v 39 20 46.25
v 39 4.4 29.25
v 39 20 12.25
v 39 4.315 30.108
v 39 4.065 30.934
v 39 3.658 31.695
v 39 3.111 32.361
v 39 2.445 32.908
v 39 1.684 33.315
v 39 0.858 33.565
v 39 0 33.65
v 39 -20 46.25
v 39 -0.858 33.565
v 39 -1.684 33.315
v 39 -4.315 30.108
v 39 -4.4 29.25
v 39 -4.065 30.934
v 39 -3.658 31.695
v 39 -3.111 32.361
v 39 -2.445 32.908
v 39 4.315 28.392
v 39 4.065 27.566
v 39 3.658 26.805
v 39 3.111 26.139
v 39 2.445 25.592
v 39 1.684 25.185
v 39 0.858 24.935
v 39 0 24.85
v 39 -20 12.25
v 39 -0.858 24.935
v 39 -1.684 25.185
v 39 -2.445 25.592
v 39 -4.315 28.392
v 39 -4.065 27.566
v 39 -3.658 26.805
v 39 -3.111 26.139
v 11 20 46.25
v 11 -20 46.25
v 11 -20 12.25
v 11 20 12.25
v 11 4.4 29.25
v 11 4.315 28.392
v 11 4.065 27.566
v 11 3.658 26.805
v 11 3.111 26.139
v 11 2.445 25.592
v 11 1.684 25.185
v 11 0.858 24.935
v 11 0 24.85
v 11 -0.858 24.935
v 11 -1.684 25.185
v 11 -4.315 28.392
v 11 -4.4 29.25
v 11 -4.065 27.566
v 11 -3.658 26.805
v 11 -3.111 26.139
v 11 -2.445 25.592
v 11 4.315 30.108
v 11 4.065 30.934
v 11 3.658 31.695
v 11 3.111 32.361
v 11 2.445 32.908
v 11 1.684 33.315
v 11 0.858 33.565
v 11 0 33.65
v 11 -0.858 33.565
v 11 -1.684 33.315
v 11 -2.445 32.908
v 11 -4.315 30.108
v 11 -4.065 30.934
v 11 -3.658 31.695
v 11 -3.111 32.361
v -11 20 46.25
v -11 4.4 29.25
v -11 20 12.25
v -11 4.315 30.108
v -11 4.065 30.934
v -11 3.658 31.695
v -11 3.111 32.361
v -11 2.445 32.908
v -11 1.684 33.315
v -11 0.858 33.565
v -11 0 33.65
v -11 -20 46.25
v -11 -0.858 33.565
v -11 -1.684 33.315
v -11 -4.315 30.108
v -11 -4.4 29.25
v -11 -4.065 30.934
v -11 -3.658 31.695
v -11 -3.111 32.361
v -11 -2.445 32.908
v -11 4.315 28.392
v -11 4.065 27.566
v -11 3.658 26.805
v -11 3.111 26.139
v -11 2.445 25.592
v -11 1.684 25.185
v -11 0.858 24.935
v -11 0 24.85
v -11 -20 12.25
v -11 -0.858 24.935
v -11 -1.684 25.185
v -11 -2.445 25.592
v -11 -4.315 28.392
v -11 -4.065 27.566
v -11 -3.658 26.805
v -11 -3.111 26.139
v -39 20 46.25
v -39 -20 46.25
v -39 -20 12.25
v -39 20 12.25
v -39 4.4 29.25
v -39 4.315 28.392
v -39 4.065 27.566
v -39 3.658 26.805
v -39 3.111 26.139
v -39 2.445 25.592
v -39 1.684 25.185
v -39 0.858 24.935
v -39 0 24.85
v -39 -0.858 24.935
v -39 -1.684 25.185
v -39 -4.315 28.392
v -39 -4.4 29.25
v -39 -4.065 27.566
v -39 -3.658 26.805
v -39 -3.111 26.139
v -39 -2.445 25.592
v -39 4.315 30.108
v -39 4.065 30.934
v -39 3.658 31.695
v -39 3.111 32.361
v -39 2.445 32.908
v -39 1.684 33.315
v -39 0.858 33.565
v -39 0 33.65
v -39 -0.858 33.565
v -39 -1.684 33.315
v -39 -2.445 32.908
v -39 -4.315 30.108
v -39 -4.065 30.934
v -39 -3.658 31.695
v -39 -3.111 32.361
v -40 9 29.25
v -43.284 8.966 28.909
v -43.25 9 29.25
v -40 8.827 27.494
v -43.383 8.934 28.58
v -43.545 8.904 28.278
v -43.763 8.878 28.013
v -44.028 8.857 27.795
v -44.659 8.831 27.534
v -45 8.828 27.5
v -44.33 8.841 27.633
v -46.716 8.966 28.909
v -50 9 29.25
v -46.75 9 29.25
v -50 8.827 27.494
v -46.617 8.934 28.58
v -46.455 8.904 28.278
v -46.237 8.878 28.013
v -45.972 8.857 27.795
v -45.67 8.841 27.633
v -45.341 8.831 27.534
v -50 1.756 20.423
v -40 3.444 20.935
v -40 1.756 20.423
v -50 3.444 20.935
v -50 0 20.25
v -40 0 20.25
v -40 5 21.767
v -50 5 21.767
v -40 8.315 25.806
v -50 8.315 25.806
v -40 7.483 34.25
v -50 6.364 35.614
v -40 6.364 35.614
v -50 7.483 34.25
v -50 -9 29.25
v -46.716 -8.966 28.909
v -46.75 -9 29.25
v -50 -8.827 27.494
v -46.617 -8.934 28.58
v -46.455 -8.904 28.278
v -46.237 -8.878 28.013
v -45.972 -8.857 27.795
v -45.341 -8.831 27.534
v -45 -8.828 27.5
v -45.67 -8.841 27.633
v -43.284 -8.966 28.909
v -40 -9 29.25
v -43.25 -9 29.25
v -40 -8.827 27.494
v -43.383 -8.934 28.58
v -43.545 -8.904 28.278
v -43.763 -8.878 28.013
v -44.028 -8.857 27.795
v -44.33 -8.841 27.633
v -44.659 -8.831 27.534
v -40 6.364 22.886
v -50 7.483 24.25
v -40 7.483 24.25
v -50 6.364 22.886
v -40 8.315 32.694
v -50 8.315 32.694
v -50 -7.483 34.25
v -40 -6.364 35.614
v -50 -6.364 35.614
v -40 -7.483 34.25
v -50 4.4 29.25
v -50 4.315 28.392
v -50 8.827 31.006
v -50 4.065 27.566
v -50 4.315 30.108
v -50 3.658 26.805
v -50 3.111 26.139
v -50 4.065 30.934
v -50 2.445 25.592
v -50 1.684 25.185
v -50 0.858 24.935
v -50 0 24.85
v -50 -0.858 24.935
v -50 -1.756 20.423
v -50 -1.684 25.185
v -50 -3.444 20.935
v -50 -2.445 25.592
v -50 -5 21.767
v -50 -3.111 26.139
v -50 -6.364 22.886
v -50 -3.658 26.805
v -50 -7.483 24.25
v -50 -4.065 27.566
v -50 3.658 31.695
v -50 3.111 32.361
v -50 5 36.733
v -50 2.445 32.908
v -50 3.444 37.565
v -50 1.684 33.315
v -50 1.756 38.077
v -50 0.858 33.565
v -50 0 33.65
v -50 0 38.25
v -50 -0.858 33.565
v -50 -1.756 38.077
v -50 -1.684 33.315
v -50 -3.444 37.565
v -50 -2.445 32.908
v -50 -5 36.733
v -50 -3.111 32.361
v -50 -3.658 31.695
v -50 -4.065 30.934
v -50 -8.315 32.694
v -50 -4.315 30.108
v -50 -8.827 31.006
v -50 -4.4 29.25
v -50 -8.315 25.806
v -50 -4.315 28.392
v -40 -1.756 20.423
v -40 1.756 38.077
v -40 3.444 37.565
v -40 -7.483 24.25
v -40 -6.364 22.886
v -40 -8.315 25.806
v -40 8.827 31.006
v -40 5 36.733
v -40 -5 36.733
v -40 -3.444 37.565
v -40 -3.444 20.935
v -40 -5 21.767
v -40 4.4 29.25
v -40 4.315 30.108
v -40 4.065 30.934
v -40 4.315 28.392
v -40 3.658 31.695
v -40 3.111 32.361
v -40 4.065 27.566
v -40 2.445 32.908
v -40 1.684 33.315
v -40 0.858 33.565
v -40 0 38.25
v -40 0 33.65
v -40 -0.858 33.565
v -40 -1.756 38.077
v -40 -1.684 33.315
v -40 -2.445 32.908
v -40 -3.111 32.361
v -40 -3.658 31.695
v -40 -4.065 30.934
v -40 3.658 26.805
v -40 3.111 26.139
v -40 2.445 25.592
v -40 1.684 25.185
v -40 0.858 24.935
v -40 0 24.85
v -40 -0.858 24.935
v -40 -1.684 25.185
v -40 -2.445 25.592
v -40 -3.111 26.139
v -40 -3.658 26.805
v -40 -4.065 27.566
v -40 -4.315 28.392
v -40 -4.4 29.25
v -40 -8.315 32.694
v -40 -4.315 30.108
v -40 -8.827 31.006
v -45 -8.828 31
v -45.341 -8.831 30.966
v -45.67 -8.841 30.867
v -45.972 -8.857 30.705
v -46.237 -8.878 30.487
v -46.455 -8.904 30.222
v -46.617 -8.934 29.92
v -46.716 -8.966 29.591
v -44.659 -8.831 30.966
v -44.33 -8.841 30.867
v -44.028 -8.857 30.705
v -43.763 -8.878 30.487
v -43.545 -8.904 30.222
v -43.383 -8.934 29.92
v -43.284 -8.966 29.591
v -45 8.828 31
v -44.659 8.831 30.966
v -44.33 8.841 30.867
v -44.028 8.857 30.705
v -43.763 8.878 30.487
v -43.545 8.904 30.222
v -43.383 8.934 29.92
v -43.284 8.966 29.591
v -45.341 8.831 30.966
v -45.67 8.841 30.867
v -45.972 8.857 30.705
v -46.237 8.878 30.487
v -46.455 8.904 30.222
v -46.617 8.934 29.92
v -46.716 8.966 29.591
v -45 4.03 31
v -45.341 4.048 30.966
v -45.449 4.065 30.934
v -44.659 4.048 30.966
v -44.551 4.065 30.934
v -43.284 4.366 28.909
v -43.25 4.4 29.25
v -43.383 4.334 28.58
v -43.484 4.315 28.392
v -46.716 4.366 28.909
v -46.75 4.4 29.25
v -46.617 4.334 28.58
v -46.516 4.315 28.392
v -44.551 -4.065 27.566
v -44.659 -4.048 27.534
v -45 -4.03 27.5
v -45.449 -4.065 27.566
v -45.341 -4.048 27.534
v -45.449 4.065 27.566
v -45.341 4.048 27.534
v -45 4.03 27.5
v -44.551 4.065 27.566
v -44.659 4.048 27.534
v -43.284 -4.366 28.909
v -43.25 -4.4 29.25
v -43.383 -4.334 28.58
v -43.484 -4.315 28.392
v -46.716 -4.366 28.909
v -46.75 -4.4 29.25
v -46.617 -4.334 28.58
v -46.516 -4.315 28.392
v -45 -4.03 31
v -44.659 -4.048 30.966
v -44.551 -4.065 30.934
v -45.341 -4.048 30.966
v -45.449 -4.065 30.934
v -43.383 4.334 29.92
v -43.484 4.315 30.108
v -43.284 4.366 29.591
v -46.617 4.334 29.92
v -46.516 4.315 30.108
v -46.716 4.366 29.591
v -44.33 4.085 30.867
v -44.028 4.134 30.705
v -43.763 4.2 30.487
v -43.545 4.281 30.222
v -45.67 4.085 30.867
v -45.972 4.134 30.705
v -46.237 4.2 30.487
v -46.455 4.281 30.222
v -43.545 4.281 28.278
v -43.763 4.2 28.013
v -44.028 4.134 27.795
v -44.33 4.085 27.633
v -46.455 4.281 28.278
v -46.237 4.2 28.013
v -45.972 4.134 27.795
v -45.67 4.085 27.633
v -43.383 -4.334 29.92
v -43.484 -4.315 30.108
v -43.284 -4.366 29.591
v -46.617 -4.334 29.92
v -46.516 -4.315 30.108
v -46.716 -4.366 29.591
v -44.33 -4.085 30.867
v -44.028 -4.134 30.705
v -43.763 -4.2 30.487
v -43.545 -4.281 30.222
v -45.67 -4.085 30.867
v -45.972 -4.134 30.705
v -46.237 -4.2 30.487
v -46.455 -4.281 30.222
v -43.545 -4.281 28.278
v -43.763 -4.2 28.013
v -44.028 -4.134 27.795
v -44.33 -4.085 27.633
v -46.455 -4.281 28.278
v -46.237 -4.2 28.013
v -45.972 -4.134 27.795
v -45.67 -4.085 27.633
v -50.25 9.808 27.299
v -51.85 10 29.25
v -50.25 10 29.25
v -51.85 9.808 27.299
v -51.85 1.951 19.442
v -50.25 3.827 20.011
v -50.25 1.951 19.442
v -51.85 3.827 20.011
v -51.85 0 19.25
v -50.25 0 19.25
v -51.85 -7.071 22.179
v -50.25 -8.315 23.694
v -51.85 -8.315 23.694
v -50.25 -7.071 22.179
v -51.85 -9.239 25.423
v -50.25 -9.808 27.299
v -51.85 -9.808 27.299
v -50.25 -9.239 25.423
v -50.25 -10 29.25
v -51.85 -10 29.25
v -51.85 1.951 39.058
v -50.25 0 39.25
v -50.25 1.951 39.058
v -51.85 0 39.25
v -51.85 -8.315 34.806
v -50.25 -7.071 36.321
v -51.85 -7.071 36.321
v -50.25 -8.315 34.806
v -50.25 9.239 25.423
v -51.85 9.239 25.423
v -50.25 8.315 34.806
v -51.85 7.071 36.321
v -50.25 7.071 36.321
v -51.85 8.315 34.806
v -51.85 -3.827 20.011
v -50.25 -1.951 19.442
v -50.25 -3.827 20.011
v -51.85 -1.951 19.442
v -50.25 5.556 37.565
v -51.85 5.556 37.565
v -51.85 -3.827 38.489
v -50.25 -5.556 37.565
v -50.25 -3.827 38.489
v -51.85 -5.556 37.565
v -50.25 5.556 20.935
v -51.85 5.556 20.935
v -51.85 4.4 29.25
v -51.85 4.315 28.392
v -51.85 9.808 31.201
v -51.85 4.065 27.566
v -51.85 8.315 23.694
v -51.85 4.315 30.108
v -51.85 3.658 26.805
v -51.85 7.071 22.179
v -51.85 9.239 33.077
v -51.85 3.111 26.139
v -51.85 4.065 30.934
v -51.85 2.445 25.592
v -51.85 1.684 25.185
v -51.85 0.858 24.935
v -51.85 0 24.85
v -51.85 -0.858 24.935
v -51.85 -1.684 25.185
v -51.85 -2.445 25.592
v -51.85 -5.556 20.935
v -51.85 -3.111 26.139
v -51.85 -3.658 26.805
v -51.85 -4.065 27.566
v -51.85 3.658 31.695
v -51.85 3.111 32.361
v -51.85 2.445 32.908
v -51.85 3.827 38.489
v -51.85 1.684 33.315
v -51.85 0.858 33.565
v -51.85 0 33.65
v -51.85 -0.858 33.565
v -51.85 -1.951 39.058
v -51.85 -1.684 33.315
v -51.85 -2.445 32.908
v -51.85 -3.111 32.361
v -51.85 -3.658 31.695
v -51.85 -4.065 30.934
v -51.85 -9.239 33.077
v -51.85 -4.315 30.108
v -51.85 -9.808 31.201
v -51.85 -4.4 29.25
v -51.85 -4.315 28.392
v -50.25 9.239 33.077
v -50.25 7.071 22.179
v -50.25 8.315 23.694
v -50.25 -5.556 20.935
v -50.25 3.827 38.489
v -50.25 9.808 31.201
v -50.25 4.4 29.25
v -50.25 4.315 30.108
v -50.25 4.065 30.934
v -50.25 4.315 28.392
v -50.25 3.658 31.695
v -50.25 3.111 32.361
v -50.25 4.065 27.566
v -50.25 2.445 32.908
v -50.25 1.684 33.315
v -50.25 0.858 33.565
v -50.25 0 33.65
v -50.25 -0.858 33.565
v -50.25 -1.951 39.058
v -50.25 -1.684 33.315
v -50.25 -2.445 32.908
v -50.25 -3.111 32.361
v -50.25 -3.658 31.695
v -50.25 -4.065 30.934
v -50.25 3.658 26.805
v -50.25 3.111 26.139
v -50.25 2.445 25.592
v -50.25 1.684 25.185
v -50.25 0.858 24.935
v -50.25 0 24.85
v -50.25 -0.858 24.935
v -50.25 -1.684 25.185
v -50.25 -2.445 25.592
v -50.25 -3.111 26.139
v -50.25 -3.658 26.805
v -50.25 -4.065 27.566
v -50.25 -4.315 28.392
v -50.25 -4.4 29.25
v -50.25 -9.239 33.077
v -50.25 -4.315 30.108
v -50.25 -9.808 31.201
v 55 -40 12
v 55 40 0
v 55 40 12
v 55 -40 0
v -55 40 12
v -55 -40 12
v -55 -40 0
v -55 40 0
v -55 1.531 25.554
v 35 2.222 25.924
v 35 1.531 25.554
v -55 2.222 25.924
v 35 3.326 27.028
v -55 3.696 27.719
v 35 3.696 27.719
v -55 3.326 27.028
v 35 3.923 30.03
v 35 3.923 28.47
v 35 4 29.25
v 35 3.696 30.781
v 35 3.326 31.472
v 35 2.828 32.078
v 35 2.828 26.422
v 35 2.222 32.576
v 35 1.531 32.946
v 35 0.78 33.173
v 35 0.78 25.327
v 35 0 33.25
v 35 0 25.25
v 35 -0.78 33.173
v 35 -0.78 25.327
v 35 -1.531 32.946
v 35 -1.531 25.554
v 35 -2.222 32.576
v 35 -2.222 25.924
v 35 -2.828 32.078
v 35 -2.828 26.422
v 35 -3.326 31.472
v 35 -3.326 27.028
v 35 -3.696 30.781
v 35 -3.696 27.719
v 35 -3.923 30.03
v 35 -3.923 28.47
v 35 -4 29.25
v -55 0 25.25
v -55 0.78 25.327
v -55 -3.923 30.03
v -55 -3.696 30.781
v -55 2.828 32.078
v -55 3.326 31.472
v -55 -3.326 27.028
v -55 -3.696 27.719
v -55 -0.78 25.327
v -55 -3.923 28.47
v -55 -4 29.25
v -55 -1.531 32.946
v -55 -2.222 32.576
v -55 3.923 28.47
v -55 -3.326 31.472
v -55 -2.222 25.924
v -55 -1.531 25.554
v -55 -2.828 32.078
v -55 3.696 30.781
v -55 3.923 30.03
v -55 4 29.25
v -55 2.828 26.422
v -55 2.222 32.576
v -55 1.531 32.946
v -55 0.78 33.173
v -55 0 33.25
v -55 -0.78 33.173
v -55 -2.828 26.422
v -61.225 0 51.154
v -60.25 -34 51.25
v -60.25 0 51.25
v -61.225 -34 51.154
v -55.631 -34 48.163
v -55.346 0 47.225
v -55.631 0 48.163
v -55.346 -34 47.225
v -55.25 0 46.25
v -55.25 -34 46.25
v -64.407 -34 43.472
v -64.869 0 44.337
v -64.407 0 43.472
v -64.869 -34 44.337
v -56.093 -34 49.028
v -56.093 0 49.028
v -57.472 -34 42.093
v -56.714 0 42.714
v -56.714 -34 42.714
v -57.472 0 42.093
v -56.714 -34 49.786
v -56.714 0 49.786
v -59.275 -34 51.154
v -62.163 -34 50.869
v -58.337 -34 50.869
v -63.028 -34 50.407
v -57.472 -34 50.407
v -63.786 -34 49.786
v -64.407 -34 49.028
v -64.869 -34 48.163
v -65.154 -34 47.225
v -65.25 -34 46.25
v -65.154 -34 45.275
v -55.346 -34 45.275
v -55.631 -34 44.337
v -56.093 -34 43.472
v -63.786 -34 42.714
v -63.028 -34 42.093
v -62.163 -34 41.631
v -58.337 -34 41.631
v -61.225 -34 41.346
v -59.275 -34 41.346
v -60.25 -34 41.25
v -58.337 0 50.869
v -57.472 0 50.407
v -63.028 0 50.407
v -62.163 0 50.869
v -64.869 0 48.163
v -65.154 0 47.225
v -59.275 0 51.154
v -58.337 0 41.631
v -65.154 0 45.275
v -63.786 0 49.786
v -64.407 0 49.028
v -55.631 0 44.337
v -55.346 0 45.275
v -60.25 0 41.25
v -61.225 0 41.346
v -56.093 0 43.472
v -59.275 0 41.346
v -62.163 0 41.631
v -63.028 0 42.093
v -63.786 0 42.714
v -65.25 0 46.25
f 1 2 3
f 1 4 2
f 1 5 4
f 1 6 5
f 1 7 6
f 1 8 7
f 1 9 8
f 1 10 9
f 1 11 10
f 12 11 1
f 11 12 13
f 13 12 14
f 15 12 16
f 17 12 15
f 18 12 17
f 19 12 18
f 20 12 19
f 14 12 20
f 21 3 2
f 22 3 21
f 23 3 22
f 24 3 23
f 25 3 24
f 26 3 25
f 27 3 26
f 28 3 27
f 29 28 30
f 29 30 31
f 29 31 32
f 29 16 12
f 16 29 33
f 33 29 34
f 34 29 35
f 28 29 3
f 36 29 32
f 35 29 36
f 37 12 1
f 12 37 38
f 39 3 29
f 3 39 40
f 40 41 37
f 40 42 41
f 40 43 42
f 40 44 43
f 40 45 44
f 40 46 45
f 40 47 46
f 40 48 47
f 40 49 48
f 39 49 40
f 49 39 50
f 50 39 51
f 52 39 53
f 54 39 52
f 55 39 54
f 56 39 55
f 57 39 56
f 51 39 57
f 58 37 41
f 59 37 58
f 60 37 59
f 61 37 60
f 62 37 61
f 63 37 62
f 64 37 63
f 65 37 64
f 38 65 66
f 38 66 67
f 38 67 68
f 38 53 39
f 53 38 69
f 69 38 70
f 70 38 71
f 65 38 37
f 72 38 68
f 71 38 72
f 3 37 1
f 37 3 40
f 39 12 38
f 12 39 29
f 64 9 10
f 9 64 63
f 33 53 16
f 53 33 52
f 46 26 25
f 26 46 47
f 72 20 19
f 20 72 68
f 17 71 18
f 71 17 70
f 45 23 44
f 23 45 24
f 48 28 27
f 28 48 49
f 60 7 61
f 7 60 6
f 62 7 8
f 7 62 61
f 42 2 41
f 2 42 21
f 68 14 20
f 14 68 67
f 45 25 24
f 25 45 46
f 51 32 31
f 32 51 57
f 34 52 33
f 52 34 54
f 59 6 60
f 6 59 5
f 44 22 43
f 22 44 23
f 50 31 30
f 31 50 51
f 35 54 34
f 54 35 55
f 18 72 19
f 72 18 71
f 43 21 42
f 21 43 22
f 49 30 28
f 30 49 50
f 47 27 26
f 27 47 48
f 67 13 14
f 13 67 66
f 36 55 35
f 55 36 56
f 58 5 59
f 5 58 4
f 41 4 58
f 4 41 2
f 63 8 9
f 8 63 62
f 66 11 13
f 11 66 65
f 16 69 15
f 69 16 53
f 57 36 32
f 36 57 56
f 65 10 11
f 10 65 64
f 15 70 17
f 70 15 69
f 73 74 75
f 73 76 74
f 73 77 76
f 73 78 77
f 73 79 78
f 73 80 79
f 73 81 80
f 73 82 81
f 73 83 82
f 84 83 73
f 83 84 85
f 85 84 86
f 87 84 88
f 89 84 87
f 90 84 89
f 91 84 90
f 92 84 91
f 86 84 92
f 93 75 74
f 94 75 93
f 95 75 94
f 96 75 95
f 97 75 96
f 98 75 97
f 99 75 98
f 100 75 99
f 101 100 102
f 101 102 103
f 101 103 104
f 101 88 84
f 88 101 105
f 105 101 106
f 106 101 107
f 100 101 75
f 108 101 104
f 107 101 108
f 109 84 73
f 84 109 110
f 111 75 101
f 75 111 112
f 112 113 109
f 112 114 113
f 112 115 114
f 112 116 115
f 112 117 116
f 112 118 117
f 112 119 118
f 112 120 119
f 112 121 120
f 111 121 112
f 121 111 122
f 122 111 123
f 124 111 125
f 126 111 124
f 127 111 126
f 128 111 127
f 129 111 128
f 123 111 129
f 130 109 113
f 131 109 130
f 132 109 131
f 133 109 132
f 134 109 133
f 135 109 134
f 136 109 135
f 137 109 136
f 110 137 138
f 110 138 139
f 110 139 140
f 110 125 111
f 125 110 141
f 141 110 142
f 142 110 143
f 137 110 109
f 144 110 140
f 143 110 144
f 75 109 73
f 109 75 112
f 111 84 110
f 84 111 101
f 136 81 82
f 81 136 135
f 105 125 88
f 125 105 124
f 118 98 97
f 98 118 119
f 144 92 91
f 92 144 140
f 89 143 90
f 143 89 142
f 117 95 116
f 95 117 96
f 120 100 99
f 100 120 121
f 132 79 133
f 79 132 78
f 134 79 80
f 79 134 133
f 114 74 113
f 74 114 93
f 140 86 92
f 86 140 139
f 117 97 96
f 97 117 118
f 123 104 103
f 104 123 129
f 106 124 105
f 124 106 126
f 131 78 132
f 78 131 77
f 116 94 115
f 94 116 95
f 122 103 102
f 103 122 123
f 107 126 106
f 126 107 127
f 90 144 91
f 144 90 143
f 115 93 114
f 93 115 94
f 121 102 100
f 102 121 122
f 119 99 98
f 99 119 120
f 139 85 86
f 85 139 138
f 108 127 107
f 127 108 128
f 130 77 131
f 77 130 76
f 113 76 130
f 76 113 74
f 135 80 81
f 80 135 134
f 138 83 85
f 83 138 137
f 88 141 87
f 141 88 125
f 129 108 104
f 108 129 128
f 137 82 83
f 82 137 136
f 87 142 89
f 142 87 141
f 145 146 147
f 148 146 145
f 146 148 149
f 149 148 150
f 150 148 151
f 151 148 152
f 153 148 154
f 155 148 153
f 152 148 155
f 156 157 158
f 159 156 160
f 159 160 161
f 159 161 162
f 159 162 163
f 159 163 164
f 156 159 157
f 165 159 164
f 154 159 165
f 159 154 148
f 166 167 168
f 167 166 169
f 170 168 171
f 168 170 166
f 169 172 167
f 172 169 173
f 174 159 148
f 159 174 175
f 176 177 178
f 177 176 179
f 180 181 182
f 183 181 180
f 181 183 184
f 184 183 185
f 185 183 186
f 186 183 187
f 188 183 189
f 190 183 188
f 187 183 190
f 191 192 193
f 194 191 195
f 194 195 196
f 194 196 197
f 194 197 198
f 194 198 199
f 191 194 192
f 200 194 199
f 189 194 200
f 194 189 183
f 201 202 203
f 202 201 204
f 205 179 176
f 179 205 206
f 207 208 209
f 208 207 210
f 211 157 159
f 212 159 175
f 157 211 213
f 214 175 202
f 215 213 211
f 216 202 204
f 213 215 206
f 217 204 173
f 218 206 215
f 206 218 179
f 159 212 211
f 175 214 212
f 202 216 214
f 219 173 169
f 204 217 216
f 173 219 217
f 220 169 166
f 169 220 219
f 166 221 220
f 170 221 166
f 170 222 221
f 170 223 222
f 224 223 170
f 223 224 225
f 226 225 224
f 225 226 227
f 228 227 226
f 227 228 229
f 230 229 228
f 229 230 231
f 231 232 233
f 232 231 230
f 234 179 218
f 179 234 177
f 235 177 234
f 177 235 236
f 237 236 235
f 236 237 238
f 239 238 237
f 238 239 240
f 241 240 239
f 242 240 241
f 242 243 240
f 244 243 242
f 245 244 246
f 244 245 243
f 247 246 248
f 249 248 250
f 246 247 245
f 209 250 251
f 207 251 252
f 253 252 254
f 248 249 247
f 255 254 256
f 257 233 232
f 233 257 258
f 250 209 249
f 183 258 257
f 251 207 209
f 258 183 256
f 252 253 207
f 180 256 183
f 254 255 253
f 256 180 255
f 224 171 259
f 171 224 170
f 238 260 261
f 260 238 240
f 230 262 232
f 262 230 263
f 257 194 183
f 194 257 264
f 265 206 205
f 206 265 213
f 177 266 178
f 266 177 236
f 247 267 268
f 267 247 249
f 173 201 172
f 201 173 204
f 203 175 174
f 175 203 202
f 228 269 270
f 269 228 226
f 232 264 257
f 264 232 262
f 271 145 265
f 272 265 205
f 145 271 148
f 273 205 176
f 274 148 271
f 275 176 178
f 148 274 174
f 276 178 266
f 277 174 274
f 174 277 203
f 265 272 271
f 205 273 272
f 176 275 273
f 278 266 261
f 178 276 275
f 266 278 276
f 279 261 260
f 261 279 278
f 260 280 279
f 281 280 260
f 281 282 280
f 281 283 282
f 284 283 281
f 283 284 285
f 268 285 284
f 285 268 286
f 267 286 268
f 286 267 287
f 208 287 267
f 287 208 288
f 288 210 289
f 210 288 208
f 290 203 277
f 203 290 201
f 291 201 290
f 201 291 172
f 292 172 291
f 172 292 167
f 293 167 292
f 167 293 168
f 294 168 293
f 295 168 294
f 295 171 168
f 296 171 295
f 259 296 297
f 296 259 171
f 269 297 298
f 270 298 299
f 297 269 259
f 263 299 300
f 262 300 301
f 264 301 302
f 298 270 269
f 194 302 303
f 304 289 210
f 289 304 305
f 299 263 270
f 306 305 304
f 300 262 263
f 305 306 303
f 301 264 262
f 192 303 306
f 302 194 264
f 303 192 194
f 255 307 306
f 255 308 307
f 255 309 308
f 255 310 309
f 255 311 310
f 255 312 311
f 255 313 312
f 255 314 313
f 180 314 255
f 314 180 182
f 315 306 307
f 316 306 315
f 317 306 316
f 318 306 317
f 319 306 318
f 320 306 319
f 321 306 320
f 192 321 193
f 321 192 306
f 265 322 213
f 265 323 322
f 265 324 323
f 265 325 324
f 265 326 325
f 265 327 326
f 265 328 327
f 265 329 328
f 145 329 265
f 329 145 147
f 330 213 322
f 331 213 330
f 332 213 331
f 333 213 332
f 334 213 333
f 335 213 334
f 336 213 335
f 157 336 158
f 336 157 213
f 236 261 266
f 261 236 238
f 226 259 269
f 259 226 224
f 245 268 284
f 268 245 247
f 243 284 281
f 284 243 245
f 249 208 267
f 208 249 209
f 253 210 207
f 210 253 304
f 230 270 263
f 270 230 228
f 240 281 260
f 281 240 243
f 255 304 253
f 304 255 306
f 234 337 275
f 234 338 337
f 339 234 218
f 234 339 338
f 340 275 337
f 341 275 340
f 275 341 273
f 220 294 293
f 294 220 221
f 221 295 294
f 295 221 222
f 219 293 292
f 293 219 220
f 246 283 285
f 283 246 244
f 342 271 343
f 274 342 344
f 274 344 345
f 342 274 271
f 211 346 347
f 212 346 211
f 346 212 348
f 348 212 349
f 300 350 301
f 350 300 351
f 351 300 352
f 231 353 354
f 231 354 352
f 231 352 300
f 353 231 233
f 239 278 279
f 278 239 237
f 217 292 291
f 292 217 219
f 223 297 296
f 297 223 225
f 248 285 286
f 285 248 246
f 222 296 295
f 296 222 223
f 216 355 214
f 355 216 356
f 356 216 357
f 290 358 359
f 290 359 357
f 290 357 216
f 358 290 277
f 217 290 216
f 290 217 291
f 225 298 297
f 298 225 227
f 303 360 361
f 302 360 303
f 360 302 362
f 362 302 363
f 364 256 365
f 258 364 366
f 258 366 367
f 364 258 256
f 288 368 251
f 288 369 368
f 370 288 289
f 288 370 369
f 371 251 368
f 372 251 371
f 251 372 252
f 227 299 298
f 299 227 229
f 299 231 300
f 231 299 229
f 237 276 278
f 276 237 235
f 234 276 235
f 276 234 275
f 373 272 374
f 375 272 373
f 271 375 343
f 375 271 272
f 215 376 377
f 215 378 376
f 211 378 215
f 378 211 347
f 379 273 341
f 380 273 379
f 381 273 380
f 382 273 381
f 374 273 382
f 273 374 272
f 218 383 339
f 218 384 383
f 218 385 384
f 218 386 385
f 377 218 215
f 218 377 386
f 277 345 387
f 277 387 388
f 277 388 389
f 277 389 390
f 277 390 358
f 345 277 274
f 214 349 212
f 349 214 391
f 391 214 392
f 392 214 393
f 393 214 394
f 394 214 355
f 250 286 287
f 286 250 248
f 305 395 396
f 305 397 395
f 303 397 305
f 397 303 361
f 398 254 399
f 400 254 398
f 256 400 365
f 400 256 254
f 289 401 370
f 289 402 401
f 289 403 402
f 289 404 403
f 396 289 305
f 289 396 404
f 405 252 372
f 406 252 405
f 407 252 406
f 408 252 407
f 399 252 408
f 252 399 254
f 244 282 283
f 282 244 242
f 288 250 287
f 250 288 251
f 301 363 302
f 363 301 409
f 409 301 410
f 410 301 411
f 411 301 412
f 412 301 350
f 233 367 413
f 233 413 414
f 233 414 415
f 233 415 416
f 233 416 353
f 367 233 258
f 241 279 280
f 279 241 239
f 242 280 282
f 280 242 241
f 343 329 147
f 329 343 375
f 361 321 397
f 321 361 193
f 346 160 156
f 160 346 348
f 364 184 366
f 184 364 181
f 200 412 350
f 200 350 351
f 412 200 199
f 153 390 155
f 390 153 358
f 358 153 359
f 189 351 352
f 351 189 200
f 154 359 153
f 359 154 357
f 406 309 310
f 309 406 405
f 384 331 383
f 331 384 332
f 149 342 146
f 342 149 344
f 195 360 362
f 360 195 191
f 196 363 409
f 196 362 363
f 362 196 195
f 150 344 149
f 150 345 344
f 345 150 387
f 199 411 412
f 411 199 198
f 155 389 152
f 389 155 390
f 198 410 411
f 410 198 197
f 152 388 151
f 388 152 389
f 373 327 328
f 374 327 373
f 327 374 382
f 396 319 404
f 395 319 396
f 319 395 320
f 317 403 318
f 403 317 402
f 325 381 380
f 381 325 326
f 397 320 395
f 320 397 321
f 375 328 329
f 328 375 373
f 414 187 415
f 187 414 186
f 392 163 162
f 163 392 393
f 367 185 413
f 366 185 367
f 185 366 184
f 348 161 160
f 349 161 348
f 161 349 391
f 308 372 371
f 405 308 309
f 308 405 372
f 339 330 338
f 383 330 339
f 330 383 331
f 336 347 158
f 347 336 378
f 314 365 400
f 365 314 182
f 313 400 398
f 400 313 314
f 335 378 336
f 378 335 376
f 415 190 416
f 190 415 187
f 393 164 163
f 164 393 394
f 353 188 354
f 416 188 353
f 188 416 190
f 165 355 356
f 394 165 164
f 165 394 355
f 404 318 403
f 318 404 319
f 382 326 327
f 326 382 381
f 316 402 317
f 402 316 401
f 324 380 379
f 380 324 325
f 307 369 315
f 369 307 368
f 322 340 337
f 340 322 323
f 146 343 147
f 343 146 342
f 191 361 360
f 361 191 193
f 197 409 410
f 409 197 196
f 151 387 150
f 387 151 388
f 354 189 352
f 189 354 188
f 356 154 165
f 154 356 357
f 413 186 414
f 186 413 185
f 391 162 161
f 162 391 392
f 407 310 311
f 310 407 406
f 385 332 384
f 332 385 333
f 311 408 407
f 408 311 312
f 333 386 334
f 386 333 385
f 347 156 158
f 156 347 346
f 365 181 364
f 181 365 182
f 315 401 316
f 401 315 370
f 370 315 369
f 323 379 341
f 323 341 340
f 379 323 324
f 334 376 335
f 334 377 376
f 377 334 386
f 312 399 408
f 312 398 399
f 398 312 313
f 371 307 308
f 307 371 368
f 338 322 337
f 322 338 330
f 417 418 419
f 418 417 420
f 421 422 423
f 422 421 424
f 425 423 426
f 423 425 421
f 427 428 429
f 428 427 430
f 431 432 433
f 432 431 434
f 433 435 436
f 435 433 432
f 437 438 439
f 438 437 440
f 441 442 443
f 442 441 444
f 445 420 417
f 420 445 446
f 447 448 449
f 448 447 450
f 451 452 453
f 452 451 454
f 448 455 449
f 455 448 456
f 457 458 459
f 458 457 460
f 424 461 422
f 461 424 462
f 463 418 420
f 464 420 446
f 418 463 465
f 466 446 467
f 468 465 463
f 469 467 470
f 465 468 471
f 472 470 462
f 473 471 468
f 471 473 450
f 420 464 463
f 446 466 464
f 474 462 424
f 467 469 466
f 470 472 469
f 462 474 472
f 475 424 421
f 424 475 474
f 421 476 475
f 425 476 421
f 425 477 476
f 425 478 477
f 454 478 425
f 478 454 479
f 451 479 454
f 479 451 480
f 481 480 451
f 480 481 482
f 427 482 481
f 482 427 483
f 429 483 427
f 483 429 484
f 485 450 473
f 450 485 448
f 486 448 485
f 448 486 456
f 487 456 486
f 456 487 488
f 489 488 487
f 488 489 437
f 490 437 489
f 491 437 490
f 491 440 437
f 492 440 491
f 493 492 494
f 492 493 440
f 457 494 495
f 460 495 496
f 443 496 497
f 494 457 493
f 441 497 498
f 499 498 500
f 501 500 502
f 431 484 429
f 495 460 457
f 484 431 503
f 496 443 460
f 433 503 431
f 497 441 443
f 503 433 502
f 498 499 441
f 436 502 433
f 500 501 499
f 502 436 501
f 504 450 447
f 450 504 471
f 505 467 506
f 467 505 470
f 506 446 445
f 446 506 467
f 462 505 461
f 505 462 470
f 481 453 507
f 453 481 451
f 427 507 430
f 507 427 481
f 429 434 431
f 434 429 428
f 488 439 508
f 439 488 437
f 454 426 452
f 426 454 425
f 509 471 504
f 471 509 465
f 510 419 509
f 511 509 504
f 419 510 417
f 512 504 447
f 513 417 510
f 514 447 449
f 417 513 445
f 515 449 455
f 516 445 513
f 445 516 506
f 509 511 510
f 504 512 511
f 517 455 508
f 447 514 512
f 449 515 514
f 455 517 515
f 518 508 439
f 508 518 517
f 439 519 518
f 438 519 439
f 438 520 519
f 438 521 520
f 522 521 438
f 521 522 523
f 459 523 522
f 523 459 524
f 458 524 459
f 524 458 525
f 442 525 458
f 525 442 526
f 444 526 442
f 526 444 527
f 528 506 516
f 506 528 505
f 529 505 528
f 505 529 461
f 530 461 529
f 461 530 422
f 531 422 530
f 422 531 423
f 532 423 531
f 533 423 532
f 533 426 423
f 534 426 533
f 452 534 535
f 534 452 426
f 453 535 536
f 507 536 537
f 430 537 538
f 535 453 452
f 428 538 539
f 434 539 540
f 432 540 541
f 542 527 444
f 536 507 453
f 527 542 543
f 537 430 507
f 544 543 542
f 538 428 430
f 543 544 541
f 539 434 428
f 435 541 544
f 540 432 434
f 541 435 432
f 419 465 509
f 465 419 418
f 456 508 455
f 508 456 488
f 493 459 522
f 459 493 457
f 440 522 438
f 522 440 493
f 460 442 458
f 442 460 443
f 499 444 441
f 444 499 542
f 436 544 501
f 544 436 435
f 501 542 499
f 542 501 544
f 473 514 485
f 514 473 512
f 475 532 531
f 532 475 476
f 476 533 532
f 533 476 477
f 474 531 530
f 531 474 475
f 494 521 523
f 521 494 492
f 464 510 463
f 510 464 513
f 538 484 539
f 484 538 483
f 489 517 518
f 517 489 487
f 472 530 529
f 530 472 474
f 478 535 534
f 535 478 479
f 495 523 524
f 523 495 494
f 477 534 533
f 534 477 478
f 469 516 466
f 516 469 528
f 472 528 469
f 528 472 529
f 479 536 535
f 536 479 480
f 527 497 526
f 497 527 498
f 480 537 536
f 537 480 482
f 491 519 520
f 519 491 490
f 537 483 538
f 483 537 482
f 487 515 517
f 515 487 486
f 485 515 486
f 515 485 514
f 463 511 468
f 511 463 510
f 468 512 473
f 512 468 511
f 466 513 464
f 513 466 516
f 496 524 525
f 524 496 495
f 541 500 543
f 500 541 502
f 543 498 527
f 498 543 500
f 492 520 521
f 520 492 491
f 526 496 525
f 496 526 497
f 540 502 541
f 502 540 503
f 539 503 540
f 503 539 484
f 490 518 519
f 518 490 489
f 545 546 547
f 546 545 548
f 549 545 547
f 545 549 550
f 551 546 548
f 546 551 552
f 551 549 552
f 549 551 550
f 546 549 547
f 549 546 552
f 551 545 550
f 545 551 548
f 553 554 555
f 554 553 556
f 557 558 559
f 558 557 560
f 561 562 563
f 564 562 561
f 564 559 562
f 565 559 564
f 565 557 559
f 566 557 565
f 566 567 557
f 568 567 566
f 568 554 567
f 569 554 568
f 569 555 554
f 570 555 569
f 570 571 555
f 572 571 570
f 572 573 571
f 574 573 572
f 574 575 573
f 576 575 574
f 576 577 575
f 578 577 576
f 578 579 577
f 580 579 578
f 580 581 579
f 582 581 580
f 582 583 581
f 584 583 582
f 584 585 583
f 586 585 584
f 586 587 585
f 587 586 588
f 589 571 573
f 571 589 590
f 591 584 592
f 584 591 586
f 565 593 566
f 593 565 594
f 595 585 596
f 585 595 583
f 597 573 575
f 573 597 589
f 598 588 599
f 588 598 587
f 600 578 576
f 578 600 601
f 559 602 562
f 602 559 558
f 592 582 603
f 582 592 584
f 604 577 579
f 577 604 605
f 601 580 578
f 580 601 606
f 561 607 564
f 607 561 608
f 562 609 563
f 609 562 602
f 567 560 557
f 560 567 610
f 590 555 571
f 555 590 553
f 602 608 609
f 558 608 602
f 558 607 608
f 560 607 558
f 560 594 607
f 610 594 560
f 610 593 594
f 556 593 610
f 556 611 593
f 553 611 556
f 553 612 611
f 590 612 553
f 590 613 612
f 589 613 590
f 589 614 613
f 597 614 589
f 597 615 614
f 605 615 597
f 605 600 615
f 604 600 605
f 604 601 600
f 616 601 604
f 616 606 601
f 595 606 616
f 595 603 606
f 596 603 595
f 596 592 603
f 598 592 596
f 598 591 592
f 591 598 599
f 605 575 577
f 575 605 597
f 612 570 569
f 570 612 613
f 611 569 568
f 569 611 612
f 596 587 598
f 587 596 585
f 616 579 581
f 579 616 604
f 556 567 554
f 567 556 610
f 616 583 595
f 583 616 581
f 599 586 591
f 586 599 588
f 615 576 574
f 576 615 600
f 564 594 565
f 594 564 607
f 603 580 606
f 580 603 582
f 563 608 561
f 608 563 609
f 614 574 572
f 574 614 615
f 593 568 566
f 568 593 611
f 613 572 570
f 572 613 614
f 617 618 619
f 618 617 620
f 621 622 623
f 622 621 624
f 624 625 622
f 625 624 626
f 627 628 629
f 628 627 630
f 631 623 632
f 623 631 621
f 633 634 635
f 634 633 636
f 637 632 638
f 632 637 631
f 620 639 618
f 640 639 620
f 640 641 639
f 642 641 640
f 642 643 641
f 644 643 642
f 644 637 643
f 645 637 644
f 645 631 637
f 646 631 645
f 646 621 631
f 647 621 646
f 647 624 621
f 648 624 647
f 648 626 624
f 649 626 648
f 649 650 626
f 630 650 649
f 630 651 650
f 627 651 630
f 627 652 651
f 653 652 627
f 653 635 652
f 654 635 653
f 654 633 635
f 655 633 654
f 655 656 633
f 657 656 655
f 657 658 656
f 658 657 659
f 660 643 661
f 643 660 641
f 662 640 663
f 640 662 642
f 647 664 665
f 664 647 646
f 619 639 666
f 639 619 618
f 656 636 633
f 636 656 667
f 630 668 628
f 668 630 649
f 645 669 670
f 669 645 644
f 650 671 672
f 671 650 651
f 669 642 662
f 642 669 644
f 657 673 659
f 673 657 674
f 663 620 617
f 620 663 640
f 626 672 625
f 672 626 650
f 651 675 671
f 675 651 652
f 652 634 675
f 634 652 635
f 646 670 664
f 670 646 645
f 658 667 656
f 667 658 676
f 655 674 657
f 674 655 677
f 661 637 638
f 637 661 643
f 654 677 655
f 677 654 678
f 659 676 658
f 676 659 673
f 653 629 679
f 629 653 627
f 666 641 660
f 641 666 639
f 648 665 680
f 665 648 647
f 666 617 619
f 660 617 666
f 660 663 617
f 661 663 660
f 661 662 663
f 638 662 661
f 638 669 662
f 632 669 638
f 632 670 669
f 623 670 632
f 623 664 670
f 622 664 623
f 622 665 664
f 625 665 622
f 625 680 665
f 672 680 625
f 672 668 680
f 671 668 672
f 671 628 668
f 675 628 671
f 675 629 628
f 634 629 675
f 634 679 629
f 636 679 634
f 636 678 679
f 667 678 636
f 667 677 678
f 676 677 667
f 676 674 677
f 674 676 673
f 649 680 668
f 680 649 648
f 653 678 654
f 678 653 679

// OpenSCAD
$fn = 32;

// ------------------------------------------------------------------------
// Machine vise: screw d8, jaws 28 x 34 mm
// Every part is its own module, assembly() places every instance.
// ------------------------------------------------------------------------

// --- part 1 ---
module vise_bed() {
  difference() {
    translate([-55, -40, 0]) cube([110, 80, 12]);
  }
}

// --- part 2 ---
module vise_jaw() {
  difference() {
    translate([-14, -20, 0]) cube([28, 40, 34]);
    translate([0, 0, 17]) rotate([0, 90, 0]) cylinder(h = 30, d = 8.8, center = true);
  }
}

// --- part 3 ---
module vise_screw() {
  translate([0, 0, -45]) cylinder(h = 90, d = 8);
}

// --- part 4 ---
module screw_collar() {
  difference() {
    cylinder(h = 10, d = 18);
    translate([0, 0, -1]) cylinder(h = 12, d = 8.8);
    translate([0, 0, 5]) rotate([90, 0, 0]) cylinder(h = 20, d = 3.5, center = true);
  }
}

// --- part 5 ---
module screw_washer() {
  difference() {
      translate([0, 0, 0]) cylinder(h = 1.6, d = 20);
      translate([0, 0, -1]) cylinder(h = 3.6, d = 8.8);
    }
}

// --- part 6 ---
module vise_handle() {
  cylinder(h = 34, d = 10);
}

// --- assembly ---
module assembly() {
  color([0.80, 0.24, 0.20]) translate([0, 0, 0]) rotate([0, 0, 0]) vise_bed();
  color([0.20, 0.45, 0.75]) translate([25, 0, 12.25]) rotate([0, 0, 0]) vise_jaw();
  color([0.25, 0.62, 0.32]) translate([-25, 0, 12.25]) rotate([0, 0, 0]) vise_jaw();
  color([0.92, 0.70, 0.18]) translate([-10, 0, 29.25]) rotate([0, 90, 0]) vise_screw();
  color([0.58, 0.35, 0.70]) translate([-50, 0, 29.25]) rotate([0, 90, 0]) screw_collar();
  color([0.16, 0.66, 0.66]) translate([-51.85, 0, 29.25]) rotate([0, 90, 0]) screw_washer();
  color([0.85, 0.48, 0.18]) translate([-60.25, 0, 46.25]) rotate([90, 0, 0]) vise_handle();
}

assembly();
